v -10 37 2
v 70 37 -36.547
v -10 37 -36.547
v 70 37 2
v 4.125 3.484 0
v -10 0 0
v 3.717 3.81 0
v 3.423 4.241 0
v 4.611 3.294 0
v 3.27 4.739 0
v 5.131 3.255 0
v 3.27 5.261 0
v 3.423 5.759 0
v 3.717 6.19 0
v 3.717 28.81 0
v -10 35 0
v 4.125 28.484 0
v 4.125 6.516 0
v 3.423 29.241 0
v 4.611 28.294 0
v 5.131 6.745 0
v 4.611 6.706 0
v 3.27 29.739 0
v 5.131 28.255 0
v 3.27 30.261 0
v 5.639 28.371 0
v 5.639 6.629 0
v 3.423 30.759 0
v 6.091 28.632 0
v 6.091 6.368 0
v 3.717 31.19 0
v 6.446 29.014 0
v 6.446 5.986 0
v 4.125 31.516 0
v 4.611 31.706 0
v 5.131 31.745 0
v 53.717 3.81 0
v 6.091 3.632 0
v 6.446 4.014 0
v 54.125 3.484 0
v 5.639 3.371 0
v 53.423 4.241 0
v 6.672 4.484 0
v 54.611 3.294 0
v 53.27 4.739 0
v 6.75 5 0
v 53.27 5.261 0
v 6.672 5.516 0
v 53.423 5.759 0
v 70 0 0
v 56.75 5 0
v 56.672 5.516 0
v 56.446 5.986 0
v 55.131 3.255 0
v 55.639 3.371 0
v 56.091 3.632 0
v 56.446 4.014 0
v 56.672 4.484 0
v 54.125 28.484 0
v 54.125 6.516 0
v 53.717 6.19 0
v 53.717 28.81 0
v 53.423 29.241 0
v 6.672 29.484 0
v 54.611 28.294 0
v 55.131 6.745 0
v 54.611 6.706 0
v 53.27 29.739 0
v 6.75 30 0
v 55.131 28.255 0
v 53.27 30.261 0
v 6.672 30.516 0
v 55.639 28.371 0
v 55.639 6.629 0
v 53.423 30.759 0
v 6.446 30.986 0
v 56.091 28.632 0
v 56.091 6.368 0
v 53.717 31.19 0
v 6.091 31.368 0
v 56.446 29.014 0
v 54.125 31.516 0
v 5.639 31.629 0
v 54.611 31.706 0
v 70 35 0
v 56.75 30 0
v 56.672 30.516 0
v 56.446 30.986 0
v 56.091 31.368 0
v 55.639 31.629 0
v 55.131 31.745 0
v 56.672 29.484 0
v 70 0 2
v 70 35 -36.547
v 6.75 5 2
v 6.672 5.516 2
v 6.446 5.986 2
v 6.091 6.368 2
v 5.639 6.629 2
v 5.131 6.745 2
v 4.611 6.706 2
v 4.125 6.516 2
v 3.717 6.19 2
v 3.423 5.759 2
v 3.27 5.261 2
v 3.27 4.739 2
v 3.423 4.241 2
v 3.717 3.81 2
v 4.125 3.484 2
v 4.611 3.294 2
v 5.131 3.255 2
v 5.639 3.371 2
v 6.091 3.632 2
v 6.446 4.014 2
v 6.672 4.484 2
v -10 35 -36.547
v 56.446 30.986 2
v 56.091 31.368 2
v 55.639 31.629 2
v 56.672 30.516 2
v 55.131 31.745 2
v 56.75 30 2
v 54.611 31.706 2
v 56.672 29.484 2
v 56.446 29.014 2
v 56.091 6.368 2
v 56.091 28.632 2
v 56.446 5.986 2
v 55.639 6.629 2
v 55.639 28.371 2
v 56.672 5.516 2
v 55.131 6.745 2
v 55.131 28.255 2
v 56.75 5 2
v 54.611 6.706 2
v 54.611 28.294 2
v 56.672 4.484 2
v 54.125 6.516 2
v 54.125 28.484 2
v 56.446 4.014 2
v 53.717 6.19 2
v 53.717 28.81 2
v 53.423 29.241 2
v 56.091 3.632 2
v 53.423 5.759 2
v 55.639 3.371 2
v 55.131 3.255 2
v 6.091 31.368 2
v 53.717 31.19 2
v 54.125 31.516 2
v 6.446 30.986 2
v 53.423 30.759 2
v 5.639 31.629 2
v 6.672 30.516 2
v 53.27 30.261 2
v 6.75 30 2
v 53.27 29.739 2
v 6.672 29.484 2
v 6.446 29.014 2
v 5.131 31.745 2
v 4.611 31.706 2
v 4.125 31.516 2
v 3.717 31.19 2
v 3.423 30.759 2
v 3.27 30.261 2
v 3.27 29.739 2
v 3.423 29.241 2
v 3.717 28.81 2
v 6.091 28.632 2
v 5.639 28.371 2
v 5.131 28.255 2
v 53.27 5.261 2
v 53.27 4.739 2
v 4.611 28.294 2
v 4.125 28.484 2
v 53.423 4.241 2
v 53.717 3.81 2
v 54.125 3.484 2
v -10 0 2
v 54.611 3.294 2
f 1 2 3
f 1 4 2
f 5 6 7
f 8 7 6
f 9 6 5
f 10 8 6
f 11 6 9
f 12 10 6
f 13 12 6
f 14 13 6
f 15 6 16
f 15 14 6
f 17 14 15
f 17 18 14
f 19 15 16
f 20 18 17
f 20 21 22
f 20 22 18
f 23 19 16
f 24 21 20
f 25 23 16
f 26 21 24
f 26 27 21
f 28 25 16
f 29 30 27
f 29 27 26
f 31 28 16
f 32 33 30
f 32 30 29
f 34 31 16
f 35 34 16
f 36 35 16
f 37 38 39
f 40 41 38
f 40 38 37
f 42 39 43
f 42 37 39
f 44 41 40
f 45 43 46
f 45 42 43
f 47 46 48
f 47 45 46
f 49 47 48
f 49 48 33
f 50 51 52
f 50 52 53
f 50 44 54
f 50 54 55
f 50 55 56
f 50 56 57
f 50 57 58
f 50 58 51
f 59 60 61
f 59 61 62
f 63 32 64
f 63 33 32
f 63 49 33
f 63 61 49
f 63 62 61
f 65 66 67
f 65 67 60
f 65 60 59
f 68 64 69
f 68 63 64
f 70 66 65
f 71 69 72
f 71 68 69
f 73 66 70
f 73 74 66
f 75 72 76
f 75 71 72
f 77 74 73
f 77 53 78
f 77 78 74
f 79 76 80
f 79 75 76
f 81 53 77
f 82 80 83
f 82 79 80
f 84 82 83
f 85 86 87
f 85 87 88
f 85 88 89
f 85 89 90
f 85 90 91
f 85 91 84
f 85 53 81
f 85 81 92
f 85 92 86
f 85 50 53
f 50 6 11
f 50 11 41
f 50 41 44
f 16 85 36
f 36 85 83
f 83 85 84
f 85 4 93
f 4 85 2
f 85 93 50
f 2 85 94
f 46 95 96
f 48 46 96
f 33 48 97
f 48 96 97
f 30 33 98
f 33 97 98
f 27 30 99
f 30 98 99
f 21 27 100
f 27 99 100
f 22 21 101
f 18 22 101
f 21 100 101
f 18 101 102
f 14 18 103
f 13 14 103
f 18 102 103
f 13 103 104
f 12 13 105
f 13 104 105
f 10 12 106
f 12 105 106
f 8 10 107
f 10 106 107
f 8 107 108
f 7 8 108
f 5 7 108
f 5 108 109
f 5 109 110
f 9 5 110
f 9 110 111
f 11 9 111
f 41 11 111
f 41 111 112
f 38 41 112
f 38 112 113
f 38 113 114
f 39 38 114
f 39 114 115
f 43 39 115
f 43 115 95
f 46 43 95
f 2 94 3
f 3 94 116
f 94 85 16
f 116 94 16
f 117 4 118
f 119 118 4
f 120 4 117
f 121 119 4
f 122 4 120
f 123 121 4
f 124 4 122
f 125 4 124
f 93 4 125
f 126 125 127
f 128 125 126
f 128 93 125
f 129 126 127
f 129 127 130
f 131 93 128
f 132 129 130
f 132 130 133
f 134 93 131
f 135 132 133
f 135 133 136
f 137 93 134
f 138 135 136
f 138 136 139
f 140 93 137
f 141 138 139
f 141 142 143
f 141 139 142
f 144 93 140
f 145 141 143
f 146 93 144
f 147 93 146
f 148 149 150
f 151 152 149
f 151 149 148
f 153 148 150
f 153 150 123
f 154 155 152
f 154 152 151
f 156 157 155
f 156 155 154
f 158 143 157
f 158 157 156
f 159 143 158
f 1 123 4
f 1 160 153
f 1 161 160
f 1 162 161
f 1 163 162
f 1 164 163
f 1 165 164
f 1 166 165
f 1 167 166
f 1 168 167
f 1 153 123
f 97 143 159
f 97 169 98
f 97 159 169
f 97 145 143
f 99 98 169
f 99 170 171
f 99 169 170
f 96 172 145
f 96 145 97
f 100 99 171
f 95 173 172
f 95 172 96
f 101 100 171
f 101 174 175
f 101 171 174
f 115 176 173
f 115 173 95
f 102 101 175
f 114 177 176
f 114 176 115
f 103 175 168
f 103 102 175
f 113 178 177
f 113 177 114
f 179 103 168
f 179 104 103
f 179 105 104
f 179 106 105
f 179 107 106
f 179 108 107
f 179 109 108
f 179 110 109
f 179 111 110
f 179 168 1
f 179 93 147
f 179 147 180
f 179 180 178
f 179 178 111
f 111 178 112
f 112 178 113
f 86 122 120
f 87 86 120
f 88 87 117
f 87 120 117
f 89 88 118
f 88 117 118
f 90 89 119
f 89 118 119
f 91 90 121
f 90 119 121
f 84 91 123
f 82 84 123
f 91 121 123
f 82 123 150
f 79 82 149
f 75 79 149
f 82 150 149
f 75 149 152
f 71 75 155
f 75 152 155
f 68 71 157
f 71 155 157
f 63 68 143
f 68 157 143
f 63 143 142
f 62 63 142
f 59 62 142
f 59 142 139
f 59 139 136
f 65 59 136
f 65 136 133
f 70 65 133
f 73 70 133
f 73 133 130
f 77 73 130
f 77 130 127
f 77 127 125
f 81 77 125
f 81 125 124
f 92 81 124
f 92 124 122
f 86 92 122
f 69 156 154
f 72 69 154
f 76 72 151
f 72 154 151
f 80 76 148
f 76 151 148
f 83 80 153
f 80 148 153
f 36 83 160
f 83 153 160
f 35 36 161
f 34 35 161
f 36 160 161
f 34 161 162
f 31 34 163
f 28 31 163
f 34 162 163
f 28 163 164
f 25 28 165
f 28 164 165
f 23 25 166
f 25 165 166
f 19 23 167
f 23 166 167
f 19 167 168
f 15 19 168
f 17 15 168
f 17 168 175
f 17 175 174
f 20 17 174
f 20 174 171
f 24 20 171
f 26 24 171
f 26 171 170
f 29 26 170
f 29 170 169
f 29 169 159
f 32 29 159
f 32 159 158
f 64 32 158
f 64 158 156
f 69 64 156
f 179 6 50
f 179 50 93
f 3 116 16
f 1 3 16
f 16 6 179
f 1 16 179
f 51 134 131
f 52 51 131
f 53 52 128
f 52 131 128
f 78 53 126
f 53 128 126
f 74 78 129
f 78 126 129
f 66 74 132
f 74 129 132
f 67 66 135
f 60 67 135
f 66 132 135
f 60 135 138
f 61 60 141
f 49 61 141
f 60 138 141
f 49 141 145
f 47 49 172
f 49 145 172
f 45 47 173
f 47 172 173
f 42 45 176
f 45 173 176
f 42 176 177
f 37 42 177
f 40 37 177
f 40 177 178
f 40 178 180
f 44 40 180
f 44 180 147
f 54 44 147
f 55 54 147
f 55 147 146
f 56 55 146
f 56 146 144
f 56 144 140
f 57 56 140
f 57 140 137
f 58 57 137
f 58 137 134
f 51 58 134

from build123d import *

# Parameters (mm, degrees)
F0_W     = 60
F0_H     = 35
F1_DEPTH = 2
F2_R     = 1.75
F3_DEPTH = 2.001
F4_DEPTH = 10
F5_DEPTH = 10
F6_W     = 80
F6_H     = 36.5470070392
F6_H_2   = 2
F7_DEPTH = 2


with BuildPart() as f1:
    # F0 (on Top) → F1 (new body)
    with BuildSketch(Plane.XY):
        with Locations((30, 17.5)):
            Rectangle(F0_W, F0_H)
    extrude(amount=F1_DEPTH)

    # F2 (on face) → F3 (cut, through all)
    with BuildSketch(Plane.XY.offset(2)):
        with Locations((5, 5)):
            Circle(F2_R)
        with Locations((5, 30)):
            Circle(F2_R)
        with Locations((55, 30)):
            Circle(F2_R)
        with Locations((55, 5)):
            Circle(F2_R)
    extrude(amount=-F3_DEPTH, mode=Mode.SUBTRACT)

    # F4 (add): a face of the model
    f4_faces = [f1.faces().sort_by_distance(p)[0] for p in [
        (60, 17.5, 1),
    ]]
    extrude(f4_faces, amount=F4_DEPTH)

    # F5 (add): a face of the model
    f5_faces = [f1.faces().sort_by_distance(p)[0] for p in [
        (0, 17.5, 1),
    ]]
    extrude(f5_faces, amount=F5_DEPTH)

    # F6 (on face) → F7 (join)
    with BuildSketch(Plane(origin=(0, 35, 0), x_dir=(-1, 0, 0), z_dir=(0, 1, 0))):
        with Locations((-30, -18.2735035196)):
            Rectangle(F6_W, F6_H)
        with Locations((-30, 1)):
            Rectangle(F6_W, F6_H_2)
    extrude(amount=F7_DEPTH)


solid = f1.part
